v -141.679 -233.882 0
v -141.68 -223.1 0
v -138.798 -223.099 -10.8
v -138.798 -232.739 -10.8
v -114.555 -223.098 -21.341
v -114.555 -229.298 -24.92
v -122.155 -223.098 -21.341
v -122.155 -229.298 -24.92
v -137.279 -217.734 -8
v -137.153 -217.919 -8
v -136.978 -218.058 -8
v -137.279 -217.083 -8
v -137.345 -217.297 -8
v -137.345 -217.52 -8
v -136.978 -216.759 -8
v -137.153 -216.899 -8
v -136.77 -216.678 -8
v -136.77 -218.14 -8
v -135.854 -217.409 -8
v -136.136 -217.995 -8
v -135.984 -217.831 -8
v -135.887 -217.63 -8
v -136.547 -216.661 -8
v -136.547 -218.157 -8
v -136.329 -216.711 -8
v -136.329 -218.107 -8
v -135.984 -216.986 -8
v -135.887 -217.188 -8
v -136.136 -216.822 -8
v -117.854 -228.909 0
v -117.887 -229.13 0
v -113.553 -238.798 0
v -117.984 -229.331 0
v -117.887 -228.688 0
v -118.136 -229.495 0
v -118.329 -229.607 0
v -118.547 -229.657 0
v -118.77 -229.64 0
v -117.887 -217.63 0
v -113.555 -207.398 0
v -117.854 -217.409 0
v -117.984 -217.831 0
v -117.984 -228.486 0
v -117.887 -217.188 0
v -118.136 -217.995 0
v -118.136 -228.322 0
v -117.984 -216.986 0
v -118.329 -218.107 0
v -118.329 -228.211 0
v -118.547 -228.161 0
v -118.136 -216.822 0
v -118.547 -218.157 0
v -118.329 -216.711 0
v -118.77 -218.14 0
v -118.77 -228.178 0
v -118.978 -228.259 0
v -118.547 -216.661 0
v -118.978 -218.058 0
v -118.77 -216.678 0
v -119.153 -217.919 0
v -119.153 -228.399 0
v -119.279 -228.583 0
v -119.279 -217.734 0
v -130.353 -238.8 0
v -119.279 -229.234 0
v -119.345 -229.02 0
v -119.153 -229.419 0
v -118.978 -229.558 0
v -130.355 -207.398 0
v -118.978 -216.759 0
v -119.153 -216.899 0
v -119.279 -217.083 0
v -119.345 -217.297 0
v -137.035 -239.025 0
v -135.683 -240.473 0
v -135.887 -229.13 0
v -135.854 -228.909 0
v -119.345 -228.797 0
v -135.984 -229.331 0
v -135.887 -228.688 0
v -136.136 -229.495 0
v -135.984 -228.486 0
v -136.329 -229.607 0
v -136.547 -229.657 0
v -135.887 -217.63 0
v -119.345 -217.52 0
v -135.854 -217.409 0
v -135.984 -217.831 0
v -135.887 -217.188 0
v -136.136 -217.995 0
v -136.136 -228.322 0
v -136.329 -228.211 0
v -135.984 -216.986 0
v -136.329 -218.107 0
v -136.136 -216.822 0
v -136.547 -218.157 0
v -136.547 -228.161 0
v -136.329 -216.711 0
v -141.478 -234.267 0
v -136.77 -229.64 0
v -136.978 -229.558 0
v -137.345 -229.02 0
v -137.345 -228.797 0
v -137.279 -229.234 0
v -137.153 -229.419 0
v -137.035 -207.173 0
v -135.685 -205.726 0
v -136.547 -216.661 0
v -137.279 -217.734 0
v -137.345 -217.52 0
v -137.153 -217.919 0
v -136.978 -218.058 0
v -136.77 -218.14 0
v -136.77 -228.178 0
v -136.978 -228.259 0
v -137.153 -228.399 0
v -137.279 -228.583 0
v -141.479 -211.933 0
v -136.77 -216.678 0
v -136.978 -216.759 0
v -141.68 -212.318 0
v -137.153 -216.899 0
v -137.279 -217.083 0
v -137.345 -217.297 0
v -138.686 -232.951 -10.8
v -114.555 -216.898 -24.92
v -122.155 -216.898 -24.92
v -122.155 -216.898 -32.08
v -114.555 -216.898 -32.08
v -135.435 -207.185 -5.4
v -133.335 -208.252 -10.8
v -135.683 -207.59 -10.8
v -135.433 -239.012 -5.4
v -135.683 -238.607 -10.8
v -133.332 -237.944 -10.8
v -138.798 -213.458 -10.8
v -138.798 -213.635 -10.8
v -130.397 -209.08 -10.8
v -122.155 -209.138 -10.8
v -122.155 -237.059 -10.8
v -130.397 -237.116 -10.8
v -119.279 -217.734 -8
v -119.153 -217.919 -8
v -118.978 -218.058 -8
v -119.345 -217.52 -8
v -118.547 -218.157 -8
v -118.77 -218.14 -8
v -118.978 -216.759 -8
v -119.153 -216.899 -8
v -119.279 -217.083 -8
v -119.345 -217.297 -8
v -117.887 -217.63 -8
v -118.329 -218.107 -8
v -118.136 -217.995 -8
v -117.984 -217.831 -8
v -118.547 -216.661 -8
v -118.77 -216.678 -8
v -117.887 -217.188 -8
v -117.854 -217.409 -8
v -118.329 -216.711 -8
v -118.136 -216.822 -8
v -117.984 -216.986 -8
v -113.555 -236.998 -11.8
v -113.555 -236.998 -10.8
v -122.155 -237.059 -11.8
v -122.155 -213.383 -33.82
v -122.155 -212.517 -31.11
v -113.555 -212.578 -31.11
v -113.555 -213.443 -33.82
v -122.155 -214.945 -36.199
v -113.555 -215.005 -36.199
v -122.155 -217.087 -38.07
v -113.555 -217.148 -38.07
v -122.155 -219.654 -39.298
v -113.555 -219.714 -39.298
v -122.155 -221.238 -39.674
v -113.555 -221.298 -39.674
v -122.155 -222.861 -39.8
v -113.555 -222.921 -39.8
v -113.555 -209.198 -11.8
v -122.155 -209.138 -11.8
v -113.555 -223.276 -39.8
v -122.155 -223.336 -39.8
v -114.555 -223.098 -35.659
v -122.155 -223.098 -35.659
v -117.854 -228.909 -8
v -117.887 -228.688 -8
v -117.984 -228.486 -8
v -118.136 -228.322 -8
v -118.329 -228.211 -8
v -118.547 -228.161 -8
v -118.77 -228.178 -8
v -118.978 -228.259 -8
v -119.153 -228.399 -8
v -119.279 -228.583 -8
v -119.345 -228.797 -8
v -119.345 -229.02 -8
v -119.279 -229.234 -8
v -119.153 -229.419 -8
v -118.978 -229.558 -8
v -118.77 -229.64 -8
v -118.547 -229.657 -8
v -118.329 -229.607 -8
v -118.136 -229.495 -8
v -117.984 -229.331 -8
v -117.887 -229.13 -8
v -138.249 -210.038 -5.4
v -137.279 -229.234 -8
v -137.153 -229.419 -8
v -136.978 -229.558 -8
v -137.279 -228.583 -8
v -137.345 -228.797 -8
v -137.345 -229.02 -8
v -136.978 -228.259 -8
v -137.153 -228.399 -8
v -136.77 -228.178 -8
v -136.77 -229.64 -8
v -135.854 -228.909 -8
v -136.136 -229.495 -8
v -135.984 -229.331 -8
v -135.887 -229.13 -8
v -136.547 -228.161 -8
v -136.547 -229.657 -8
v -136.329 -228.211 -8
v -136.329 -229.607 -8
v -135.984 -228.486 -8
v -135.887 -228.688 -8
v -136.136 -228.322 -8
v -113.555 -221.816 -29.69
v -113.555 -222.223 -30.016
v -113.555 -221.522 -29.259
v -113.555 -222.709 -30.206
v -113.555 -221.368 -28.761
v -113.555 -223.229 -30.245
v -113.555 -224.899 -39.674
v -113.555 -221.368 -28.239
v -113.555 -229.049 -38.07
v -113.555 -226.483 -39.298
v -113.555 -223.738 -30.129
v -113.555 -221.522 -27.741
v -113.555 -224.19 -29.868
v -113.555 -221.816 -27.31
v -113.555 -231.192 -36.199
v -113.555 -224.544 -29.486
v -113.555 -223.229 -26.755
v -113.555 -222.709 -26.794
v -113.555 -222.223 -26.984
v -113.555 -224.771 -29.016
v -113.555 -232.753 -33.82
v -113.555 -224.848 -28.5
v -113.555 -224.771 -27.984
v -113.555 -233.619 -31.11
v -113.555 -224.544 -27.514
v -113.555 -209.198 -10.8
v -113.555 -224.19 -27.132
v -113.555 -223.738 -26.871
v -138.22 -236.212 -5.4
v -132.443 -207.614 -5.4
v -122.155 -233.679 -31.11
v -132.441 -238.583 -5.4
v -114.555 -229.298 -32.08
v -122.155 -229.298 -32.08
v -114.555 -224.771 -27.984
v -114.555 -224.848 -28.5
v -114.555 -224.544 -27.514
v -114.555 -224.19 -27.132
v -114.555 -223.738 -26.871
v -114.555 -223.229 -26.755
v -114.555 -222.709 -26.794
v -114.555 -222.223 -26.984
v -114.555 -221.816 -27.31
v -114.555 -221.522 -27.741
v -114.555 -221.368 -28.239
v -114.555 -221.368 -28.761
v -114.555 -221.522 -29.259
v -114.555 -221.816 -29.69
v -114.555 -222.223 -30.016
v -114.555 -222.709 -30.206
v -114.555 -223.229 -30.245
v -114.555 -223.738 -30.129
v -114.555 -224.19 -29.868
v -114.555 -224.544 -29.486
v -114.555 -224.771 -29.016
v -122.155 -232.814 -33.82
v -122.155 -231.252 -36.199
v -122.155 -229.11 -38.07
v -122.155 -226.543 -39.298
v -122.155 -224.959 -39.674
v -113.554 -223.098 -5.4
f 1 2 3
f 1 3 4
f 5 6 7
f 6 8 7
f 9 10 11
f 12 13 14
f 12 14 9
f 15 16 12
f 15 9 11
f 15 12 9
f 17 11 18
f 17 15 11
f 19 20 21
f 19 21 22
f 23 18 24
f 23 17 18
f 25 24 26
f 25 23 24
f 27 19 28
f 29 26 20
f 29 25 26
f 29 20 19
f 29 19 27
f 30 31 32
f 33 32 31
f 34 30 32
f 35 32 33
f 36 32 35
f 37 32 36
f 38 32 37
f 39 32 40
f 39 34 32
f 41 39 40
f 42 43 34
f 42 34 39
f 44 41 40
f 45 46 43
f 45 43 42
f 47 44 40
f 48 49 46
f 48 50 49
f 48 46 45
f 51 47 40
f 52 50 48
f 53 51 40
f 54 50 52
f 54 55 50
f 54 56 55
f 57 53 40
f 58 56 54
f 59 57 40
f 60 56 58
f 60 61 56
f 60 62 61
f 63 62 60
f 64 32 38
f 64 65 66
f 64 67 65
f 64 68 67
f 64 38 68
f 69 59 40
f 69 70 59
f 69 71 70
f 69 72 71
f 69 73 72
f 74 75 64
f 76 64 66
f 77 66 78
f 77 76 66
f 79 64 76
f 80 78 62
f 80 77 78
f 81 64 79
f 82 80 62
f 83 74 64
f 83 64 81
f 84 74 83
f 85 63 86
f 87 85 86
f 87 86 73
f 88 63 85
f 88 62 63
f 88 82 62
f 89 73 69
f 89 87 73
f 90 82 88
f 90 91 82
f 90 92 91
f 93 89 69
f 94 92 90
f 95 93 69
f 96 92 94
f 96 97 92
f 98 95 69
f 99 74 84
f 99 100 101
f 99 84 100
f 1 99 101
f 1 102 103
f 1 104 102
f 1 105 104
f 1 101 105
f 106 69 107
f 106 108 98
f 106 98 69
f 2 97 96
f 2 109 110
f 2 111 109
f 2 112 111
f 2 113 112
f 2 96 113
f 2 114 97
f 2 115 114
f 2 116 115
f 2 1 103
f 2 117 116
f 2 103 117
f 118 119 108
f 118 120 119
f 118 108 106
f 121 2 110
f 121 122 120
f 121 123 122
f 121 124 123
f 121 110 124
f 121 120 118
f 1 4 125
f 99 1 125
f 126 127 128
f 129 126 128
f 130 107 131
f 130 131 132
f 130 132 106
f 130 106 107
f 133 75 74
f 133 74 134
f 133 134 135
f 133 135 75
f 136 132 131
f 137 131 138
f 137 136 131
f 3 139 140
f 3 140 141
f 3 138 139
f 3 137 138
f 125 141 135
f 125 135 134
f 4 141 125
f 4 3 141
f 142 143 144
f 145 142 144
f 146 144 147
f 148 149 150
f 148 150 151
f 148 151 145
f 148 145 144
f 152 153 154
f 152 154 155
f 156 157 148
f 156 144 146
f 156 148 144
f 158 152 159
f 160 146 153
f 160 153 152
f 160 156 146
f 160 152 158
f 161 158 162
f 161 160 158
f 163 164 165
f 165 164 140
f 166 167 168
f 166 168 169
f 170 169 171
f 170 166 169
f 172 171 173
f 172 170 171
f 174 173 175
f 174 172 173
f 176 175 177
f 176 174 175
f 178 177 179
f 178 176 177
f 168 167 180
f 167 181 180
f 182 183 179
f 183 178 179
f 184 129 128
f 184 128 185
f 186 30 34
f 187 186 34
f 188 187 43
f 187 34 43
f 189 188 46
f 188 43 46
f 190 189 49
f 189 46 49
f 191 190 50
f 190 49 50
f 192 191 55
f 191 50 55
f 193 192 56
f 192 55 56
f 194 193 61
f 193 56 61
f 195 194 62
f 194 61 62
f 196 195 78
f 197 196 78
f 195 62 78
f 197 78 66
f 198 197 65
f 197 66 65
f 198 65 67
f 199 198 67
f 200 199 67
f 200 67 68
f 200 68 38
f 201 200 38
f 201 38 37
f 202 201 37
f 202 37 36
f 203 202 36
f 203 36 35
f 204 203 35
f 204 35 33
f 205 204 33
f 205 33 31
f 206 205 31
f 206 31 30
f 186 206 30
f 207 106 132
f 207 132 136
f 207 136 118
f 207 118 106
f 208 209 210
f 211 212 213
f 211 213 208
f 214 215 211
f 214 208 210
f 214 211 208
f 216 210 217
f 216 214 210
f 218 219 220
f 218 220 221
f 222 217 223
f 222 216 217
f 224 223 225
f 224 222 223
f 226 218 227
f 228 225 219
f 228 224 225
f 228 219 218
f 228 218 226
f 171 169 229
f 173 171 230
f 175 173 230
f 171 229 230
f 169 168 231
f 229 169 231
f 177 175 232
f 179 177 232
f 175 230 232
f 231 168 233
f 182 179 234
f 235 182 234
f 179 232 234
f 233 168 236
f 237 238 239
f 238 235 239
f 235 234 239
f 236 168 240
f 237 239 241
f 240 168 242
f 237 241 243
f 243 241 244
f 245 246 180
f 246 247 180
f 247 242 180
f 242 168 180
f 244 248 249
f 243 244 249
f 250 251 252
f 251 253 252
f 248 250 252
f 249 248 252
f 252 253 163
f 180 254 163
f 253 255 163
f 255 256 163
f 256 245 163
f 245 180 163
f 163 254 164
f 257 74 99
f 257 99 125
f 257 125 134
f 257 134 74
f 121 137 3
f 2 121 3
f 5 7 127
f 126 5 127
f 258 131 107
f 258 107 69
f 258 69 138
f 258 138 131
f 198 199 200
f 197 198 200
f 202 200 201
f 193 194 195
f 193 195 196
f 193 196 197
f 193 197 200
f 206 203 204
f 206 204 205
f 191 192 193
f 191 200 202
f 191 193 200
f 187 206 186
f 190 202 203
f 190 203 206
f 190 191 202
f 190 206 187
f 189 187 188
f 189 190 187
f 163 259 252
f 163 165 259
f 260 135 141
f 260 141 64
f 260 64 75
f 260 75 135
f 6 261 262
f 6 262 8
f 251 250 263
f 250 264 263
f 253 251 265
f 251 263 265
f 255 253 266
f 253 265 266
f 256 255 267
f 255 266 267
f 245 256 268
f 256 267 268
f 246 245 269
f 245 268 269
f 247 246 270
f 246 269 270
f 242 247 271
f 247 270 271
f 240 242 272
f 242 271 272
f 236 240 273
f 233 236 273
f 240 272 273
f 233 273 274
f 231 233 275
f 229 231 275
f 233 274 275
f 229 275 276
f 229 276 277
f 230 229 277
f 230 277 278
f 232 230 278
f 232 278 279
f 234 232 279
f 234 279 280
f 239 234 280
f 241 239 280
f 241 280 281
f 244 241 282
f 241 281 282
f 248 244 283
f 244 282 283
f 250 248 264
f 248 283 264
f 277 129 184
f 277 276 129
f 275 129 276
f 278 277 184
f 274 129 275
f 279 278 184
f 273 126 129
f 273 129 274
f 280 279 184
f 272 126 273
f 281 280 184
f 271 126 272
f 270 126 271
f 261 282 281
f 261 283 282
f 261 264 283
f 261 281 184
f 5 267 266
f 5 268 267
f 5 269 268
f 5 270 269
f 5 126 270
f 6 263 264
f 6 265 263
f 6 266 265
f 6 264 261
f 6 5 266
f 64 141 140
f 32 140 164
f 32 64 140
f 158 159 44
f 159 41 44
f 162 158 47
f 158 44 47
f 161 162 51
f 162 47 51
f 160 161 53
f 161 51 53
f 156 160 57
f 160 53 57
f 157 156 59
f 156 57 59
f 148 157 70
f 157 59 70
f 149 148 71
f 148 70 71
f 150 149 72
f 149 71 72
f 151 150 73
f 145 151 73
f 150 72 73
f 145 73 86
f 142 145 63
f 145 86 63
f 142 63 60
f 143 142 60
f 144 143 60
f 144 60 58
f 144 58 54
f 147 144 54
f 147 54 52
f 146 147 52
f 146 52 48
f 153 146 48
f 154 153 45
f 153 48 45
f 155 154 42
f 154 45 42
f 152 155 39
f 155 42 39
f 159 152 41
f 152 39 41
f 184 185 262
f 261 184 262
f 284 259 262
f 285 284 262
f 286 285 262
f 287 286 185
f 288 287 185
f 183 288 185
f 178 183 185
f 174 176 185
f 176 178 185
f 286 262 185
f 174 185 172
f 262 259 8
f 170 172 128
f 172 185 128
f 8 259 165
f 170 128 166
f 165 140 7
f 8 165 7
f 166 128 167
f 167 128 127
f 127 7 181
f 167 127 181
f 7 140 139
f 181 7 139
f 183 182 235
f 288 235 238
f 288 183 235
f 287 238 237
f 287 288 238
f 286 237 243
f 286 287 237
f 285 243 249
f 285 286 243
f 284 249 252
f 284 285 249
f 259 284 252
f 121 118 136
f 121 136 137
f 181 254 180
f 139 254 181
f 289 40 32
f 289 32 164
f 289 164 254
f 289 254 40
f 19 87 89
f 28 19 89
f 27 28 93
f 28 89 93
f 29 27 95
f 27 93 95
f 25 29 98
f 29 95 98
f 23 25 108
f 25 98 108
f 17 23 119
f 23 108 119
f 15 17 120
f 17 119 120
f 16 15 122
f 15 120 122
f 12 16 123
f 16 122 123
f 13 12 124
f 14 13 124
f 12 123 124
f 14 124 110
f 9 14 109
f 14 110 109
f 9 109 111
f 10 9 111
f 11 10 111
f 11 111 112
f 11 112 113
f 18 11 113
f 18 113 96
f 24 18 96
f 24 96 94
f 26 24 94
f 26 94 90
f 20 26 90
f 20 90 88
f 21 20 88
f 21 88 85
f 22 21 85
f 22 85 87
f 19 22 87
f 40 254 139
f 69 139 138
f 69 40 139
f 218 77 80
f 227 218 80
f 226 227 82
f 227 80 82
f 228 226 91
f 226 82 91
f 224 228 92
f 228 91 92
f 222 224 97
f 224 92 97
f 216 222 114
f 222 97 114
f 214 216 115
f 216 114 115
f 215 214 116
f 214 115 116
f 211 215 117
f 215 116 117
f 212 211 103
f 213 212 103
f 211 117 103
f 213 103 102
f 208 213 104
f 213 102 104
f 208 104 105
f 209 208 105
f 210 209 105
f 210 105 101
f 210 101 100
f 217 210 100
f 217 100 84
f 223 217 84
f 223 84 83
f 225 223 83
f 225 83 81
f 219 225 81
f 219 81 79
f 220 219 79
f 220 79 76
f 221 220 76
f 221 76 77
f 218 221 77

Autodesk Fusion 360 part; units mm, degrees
sketch "Support moteur/Cam" plane through (0, 0, 0) normal (0, 0, 1) x (1, 0, 0)
  line L0 (-113.5546, -207.3984) -> (-130.3546, -207.3984)
  line L1 (-130.3546, -207.3984) -> (-135.6849, -205.7263)
  line L2 (-135.6849, -205.7263) -> (-141.4789, -211.9329)
  line L3 (-141.4789, -211.9329) -> (-141.6802, -212.3176)
  line L4 (-141.6802, -212.3176) -> (-141.6802, -223.1)
  line L5 (-113.5528, -238.7984) -> (-130.3528, -238.8003)
  line L6 (-130.3528, -238.8003) -> (-135.6829, -240.4729)
  line L7 (-141.4776, -234.267) -> (-141.679, -233.8823)
  line L8 (-141.679, -233.8823) -> (-141.6802, -223.1)
  line L9 (-135.6829, -240.4729) -> (-141.4776, -234.267)
  circle A0 centre (-136.6035, -217.4087) radius 0.75
  circle A1 centre (-118.6035, -217.4087) radius 0.75
  circle A2 centre (-136.6035, -228.9087) radius 0.75
  circle A3 centre (-118.6035, -228.9087) radius 0.75
  line L10 (-113.5546, -207.3984) -> (-113.5528, -238.7984)
  line L11 (-141.6802, -223.1) -> (-113.5537, -223.0984)
  point P0 (-136.6035, -217.4087)
  point P1 (-118.6035, -217.4087)
  point P2 (-118.6035, -228.9087)
  point P3 (-136.6035, -228.9087)
  dimension "d217" = 16.8
  dimension "d227" = 1.5
  dimension "d228" = 1.5
  dimension "d229" = 1.5
  dimension "d230" = 1.5
ref_plane "WorkPlane9" through (0, 0, -10.8) normal (0, 0, 1) x (1, 0, 0)
sketch "Support moteur/Cam2" plane through (0, 0, -10.8) normal (0, 0, 1) x (1, 0, 0)
  line L0 (-113.5546, -236.9984) -> (-130.3974, -237.1164)
  line L1 (-130.3974, -237.1164) -> (-135.6833, -238.6066)
  line L2 (-135.6833, -238.6066) -> (-138.7984, -232.7391)
  line L3 (-138.7984, -223.0984) -> (-138.7984, -232.7391)
  line L4 (-138.7984, -223.0984) -> (-138.7984, -213.4577)
  line L5 (-135.6833, -207.5901) -> (-138.7984, -213.4577)
  line L6 (-130.3974, -209.0804) -> (-135.6833, -207.5901)
  line L7 (-113.5546, -209.1984) -> (-130.3974, -209.0804)
  line L8 (-122.1546, -237.0587) -> (-122.1546, -209.1381)
  line L9 (-113.5546, -209.1984) -> (-113.5546, -236.9984)
  line L10 (-138.7984, -223.0984) -> (-113.5546, -223.0984) construction
  dimension "d221" = 8.6
loft "Loft1" add profiles "Support moteur/Cam2", "Support moteur/Cam" section 1 section 2 contours L0 L1 L2 L3 L4 L10 L11 | L5 L6 L7 L8 L9 L10 L11 | A0 | A1
extrude "Support Moteur/Cam" cut sketch "Support moteur/Cam" against normal blind 8 contours A0 | A1 | A2 | A3
extrude "Extrude10" add sketch "Support moteur/Cam2" against normal blind 29 contours L0 L7 L8 L9
chamfer "Chamfer3" distance 4.9 distance2 28 2 edges at (-117.8546, -209.1683, -39.8) (-117.8546, -237.0285, -39.8) measured on face at (-119.2879, -218.4651, -39.8) measured on face at (-119.2879, -218.4651, -39.8)
fillet "Fillet1" radius 10.5 2 edges at (-117.8546, -232.1284, -39.8) (-117.8546, -214.0684, -39.8)
sketch "Support moteur/Cam3" plane through (-122.1546, 0, 0) normal (-1, 0, 0) x (0, -1, 0)
  ellipse E0 centre (222.8605, -29.3) end of major axis (212.3603, -29.3) minor radius 10.5 (212.5175, -31.11) -> (222.8605, -39.8) ccw
  line L0 (222.8605, -39.8) -> (223.3362, -39.8)
  ellipse E1 centre (223.3362, -29.3) end of major axis (233.8365, -29.3) minor radius 10.5 (223.3362, -39.8) -> (233.6793, -31.11) ccw
  line L1 (233.6793, -31.11) -> (237.0587, -11.8)
  line L2 (237.0587, -11.8) -> (237.0587, -10.8)
  line L3 (237.0587, -10.8) -> (209.1381, -10.8)
  line L4 (209.1381, -10.8) -> (209.1381, -11.8)
  line L5 (209.1381, -11.8) -> (212.5175, -31.11)
  line L6 (223.0984, -10.8) -> (223.0984, -28.5) construction
  line L7 (229.2984, -32.0796) -> (229.2984, -24.9204)
  line L8 (229.2984, -24.9204) -> (223.0984, -21.3409)
  line L9 (223.0984, -21.3409) -> (216.8984, -24.9204)
  line L10 (216.8984, -24.9204) -> (216.8984, -32.0796)
  line L11 (216.8984, -32.0796) -> (223.0984, -35.6591)
  line L12 (223.0984, -35.6591) -> (229.2984, -32.0796)
  circle A0 centre (223.0984, -28.5) radius 1.75
  line L13 (223.0984, -10.8) -> (223.0984, -33.8) construction
  circle A1 centre (223.0984, -33.8) radius 1.6 construction
  circle A2 centre (223.0984, -33.8) radius 3.1 construction
  line L14 (217.8116, -36.9) -> (223.0984, -36.9) construction
  line L15 (221.2654, -36.3) -> (224.9314, -36.3)
  circle A3 centre (223.0984, -33.8) radius 4.1 construction
  point P0 (223.0984, -28.5)
  dimension "d233" = 17.7
  dimension "d235" = 12.4
  dimension "d236" = 3.5
  dimension "d380" = 23
  dimension "d381" = 3.2
  dimension "d382" = 6.2
  dimension "d383" = 0.6
  dimension "d384" = 8.2
  dimension "d395" = 9
extrude "Extrude12" cut sketch "Support moteur/Cam3" against normal through all contours A0
extrude "Extrude13" cut sketch "Support moteur/Cam3" against normal blind 7.6 contours L7 L8 L9 L10 L11 L12
extrude "Extrude19" [suppressed]
fillet "Fillet2" [suppressed]
equation "Trous_Vis_diam2 = 2.2 mm"
